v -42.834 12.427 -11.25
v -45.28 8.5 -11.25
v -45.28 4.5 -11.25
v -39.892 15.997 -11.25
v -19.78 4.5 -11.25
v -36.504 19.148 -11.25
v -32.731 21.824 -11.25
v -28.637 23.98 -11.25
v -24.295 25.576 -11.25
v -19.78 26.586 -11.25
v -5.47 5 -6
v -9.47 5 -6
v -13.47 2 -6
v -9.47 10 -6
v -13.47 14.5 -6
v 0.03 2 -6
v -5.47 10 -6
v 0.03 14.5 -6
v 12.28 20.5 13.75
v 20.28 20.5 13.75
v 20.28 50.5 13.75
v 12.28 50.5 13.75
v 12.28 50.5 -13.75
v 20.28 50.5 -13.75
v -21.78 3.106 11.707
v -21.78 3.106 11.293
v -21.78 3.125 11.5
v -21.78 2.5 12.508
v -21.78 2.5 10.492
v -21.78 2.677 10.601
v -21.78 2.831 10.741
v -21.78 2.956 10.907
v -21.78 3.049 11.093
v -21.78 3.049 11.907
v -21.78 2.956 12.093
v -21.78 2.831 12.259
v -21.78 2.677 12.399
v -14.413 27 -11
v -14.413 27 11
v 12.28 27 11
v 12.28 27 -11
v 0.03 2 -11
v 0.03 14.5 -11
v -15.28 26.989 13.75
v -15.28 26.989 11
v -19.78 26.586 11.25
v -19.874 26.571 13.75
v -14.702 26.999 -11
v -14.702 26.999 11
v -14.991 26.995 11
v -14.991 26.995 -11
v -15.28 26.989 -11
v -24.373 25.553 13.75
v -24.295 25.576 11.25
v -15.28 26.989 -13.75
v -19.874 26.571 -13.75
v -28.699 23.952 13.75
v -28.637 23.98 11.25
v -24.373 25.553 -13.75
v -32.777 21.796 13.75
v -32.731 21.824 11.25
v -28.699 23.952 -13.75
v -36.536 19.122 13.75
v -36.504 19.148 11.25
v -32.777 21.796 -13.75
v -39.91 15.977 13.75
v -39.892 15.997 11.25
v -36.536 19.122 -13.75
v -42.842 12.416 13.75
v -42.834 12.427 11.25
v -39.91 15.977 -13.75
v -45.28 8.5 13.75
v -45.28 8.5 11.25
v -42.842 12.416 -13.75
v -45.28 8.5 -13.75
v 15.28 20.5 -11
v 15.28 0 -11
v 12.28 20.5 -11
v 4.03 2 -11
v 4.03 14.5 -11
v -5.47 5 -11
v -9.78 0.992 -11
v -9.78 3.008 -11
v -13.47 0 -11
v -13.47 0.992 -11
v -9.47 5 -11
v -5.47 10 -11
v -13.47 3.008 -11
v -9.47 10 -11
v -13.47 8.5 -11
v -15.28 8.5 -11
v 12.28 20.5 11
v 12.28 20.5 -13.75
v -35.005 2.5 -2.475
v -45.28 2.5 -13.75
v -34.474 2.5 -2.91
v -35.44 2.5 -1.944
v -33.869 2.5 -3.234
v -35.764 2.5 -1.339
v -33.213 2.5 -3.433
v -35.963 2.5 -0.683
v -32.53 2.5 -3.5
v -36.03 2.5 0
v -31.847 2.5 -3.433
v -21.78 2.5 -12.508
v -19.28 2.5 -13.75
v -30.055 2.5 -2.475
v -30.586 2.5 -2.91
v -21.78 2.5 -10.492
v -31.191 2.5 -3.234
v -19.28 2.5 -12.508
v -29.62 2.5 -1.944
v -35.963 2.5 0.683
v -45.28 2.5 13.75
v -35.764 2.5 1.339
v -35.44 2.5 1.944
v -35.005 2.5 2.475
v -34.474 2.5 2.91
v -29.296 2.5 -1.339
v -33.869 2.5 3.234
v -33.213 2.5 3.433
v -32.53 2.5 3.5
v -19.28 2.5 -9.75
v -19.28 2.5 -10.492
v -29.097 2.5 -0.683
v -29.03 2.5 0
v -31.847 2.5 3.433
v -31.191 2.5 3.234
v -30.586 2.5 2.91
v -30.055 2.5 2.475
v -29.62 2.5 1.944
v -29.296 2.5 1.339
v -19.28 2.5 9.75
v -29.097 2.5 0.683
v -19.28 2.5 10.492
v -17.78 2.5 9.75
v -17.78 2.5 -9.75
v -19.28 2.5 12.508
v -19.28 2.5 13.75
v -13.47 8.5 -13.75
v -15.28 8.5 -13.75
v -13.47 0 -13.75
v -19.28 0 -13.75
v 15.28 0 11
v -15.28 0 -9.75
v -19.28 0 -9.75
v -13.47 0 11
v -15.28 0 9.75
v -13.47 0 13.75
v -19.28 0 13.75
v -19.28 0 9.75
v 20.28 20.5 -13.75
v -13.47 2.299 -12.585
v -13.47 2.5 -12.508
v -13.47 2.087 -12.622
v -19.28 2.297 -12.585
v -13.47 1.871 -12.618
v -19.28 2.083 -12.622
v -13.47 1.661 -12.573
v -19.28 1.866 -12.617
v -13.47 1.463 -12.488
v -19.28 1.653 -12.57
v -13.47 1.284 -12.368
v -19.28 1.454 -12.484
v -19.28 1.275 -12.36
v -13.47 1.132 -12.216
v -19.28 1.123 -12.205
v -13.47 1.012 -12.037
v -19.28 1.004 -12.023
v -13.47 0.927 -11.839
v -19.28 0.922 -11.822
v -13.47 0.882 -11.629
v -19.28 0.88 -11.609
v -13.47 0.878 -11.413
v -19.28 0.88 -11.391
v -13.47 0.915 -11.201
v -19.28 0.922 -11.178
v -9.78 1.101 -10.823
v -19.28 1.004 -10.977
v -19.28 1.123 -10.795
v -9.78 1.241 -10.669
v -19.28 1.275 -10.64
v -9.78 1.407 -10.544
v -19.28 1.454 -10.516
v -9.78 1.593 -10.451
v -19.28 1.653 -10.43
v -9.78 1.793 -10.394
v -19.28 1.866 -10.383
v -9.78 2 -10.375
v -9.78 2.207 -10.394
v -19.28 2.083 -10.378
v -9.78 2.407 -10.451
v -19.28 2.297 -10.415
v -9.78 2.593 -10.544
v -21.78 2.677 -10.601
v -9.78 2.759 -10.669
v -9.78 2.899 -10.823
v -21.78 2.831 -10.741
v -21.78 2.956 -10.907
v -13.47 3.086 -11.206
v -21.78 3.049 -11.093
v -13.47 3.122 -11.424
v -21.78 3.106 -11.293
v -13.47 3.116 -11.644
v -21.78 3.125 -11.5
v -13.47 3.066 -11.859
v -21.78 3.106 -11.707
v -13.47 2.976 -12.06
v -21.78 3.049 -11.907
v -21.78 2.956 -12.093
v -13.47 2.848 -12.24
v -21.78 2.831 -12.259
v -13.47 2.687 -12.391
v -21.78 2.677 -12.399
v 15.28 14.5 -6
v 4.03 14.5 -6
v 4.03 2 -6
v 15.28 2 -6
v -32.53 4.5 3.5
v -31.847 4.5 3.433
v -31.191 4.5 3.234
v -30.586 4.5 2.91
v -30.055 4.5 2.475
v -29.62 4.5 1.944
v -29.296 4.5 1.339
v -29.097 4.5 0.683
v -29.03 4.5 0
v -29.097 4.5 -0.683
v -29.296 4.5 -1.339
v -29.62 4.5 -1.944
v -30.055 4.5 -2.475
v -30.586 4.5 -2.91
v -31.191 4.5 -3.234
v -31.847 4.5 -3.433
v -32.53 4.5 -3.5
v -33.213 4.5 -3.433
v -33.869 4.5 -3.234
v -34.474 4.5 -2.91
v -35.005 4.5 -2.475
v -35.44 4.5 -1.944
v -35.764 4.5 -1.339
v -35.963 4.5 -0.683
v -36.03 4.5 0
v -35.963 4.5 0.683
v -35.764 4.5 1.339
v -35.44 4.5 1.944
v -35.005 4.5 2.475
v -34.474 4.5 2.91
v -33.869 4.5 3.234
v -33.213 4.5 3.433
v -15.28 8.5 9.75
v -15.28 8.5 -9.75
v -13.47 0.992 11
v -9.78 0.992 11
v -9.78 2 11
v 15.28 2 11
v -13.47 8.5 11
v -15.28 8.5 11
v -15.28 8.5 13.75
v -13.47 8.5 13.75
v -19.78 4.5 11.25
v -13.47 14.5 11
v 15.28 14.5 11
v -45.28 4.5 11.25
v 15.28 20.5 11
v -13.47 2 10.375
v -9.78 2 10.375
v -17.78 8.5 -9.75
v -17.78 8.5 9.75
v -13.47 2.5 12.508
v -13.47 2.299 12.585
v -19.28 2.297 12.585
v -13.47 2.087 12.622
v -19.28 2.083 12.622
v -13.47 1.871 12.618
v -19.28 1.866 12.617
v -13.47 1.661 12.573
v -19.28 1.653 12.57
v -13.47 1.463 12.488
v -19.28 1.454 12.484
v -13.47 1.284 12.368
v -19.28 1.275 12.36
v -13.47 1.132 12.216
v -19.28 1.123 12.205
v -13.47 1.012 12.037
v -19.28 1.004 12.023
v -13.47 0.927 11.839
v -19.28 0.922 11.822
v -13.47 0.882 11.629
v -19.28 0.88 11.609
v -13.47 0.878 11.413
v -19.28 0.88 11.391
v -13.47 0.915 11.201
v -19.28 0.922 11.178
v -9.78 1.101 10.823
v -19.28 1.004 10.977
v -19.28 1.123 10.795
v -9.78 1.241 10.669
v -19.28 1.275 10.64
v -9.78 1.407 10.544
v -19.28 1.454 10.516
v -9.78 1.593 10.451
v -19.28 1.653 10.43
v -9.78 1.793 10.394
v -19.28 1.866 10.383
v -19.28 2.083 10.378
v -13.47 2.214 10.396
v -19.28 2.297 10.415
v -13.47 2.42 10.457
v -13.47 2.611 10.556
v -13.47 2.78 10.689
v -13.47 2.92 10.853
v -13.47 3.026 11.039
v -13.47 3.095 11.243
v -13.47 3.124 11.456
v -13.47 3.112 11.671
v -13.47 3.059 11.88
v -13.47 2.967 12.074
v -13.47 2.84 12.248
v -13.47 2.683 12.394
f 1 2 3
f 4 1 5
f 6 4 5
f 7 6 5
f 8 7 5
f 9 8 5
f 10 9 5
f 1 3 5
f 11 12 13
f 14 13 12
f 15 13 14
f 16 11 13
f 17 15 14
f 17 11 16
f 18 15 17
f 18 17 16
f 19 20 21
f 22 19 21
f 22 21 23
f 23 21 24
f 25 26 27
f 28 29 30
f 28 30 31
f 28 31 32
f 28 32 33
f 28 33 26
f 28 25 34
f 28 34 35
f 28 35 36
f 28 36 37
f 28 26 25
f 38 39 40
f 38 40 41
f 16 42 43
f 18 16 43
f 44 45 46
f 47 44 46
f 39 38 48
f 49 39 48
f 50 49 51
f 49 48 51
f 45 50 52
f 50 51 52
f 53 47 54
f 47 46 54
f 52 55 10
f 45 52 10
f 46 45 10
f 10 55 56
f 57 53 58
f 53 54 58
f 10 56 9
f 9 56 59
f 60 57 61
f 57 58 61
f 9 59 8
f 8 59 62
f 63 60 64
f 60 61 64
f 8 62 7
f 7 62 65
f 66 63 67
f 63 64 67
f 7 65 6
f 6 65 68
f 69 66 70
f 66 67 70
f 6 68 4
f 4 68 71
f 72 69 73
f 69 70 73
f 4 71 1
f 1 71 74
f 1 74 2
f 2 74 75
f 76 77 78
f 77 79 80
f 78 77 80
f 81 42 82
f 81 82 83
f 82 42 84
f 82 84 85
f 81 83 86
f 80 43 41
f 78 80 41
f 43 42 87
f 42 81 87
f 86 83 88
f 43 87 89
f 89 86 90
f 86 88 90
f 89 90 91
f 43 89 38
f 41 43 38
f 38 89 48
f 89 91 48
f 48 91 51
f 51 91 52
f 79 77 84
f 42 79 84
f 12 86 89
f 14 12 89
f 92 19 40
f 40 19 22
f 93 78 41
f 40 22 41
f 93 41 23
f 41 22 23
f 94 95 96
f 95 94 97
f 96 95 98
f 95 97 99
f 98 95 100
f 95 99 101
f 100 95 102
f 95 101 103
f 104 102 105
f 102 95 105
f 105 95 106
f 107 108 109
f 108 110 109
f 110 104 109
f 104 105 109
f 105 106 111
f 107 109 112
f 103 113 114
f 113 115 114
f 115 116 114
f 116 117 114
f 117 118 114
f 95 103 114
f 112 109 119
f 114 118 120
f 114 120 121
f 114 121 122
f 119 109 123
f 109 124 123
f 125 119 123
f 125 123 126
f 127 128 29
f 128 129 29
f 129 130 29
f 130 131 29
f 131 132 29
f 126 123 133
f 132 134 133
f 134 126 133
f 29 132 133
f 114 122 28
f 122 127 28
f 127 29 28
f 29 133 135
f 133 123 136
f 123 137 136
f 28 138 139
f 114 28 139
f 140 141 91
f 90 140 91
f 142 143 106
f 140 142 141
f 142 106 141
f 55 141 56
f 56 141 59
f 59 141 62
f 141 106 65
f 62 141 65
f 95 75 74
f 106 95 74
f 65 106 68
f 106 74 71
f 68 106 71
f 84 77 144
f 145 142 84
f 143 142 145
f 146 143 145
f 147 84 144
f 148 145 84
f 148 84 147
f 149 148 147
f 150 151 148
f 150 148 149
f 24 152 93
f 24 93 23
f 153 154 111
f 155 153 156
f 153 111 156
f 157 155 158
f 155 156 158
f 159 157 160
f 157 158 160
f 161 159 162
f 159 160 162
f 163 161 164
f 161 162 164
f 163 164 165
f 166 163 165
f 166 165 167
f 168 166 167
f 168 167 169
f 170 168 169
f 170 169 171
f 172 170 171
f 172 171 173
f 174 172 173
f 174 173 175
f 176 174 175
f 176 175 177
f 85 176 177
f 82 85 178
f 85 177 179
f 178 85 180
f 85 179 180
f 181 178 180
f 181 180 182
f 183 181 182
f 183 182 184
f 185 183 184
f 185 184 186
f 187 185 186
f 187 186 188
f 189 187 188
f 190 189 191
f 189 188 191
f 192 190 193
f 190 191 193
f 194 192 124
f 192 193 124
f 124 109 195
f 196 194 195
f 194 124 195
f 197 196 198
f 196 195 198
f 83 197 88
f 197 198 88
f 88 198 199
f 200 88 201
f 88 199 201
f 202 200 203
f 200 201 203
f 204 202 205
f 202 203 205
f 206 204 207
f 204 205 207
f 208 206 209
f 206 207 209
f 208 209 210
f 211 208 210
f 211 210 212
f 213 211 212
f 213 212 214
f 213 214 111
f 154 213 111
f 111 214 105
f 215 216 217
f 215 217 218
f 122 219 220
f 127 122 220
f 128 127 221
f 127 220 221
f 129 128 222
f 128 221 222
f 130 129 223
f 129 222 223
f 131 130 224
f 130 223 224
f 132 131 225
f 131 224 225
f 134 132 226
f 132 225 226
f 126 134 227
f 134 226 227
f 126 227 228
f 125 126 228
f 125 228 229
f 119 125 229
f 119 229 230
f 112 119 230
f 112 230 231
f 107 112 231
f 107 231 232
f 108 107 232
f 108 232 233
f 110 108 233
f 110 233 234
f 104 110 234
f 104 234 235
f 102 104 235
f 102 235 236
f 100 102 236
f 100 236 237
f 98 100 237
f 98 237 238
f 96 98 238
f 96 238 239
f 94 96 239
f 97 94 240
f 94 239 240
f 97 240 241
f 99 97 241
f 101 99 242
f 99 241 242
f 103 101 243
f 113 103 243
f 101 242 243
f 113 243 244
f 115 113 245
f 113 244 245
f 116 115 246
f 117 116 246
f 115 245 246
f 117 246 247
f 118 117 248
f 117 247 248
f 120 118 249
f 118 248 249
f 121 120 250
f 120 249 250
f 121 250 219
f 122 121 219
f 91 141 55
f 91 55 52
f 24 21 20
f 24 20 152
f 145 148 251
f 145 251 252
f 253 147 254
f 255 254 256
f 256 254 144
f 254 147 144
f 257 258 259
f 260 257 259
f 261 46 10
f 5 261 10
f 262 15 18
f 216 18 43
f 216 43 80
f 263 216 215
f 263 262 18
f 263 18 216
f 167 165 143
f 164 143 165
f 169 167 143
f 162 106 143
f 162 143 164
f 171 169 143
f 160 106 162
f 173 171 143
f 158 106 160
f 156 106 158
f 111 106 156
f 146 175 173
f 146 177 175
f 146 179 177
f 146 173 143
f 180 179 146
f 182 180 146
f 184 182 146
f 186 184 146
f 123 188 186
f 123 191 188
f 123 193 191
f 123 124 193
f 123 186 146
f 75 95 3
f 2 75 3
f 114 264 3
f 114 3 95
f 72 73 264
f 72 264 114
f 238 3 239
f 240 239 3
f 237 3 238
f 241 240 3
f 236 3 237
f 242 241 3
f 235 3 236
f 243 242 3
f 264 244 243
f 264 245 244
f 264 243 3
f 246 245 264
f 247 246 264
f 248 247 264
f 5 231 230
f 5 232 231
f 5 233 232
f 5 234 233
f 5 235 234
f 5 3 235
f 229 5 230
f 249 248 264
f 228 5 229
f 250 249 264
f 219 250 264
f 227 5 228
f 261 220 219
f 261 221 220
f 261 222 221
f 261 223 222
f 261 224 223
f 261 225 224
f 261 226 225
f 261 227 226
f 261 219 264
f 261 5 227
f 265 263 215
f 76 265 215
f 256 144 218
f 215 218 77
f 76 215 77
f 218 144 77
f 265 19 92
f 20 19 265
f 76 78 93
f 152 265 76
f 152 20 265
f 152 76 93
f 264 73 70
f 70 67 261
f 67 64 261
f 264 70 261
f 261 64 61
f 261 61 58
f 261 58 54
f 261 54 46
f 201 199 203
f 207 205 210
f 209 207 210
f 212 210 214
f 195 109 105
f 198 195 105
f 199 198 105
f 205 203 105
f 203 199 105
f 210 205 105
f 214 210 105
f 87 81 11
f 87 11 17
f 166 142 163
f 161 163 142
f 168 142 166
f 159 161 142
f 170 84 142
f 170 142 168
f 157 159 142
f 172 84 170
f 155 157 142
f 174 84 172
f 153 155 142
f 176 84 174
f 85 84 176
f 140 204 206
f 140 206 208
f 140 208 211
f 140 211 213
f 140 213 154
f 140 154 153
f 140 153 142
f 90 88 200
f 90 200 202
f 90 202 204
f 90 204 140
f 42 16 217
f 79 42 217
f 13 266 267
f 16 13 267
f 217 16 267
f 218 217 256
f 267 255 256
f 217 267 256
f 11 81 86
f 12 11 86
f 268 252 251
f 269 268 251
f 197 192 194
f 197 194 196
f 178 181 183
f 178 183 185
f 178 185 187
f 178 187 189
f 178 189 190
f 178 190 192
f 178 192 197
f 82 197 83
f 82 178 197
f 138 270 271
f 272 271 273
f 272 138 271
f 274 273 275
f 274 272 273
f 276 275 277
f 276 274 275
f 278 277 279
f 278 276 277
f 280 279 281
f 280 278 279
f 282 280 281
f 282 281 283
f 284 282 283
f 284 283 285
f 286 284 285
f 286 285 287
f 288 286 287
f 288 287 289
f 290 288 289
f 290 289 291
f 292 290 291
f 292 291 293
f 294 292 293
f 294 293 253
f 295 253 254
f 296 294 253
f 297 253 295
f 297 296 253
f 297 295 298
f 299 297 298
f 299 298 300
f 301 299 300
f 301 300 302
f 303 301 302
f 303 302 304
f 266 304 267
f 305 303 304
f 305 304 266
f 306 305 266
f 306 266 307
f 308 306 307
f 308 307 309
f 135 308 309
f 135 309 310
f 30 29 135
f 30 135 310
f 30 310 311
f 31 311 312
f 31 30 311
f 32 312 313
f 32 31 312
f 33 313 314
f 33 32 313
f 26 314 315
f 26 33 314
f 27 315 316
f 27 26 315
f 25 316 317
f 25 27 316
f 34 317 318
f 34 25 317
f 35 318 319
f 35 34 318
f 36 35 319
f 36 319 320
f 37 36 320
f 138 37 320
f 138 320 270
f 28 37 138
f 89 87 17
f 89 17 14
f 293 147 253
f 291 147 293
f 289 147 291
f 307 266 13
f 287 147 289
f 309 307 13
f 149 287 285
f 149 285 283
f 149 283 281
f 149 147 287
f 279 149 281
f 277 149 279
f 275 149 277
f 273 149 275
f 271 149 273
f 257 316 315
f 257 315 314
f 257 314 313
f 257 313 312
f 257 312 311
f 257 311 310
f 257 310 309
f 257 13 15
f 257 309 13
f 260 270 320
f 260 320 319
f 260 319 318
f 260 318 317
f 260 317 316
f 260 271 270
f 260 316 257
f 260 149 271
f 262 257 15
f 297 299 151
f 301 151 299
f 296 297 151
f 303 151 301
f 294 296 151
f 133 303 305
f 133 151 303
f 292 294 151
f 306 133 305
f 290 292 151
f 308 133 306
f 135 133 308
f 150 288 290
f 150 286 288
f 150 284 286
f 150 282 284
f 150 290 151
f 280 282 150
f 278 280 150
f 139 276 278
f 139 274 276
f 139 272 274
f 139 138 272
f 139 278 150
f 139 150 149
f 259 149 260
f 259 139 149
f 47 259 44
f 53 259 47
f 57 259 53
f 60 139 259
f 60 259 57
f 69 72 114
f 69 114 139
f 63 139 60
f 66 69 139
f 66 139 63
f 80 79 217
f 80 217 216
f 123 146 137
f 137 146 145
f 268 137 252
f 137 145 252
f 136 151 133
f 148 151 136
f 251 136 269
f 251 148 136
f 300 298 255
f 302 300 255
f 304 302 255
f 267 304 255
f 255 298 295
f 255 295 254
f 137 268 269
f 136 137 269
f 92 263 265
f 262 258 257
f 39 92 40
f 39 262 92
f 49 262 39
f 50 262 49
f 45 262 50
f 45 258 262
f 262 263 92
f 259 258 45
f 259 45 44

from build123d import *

# Parameters (mm, degrees)
SKETCH2_W                        = 30.56
SKETCH2_H                        = 22
BOSS_EXTRUDE1_DEPTH              = 27
SKETCH4_W                        = 28.75
SKETCH4_H                        = 12.5
CUT_EXTRUDE1_DEPTH               = 17
SKETCH5_W                        = 4
SKETCH5_H                        = 12.5
SKETCH5_H_2                      = 5
CUT_EXTRUDE2_DEPTH               = 39.032596546
SKETCH9_W                        = 27.5
SKETCH9_H                        = 18.5
BOSS_EXTRUDE2_DEPTH              = 30
FILLET1_R                        = 35
BOSS_EXTRUDE3_DEPTH              = 6
SKETCH10_6_W                     = 25.5
SKETCH10_6_H                     = 22.5
CUT_EXTRUDE3_DEPTH               = 51.80935839
SKETCH13_W                       = 22.5
SKETCH13_H                       = 2
BOSS_EXTRUDE4_DEPTH              = 25.5
SKETCH14_R                       = 3.5
CUT_EXTRUDE4_DEPTH               = 53.398386426
SKETCH20_W                       = 4
SKETCH20_H                       = 8.5
BOSS_EXTRUDE13_DEPTH             = 4
BOSS_EXTRUDE13_DIRECTION_2_REACH = 45.035
CUT_EXTRUDE5_START               = -4
SKETCH15_R                       = 1.125
CUT_EXTRUDE5_DEPTH               = 12
SKETCH21_W                       = 22
SKETCH21_H                       = 6.5
BOSS_EXTRUDE14_DEPTH             = 5
SKETCH22_W                       = 27.5
SKETCH22_H                       = 30
BOSS_EXTRUDE15_DEPTH             = 8


with BuildPart() as part:
    # Sketch2 → Boss-Extrude1 (new body)
    with BuildSketch(Plane(origin=(0, 0, 0), x_dir=(1, 0, 0), z_dir=(0, 1, 0))):
        Rectangle(SKETCH2_W, SKETCH2_H)
    extrude(amount=BOSS_EXTRUDE1_DEPTH)

    # Sketch4 → Cut-Extrude1 (cut)
    with BuildSketch(Plane.XY.offset(11)):
        with Locations((0.905, 8.25)):
            Rectangle(SKETCH4_W, SKETCH4_H)
    extrude(amount=-CUT_EXTRUDE1_DEPTH, mode=Mode.SUBTRACT)

    # Sketch5 → Cut-Extrude2 (cut, through all)
    with BuildSketch(Plane(origin=(0, 0, -11), x_dir=(-1, 0, 0), z_dir=(0, 0, -1))):
        with Locations((-2.03, 8.25)):
            Rectangle(SKETCH5_W, SKETCH5_H)
        with Locations((7.47, 7.5)):
            Rectangle(SKETCH5_W, SKETCH5_H_2)
    extrude(amount=-CUT_EXTRUDE2_DEPTH, mode=Mode.SUBTRACT)

    # Sketch9 → Boss-Extrude2 (add)
    with BuildSketch(Plane.ZY.offset(15.28)):
        with Locations((0, 17.75)):
            Rectangle(SKETCH9_W, SKETCH9_H)
    extrude(amount=BOSS_EXTRUDE2_DEPTH)

    # Fillet1
    # the kernel refuses this fillet: 35 mm, written as the material it takes off along each edge
    with BuildSketch(Plane(origin=(-45.28, 27, -90.91662167), x_dir=(1, 0, 0), z_dir=(0, 0, 1))) as fillet1_piece_1:
        with BuildLine():
            CenterArc((30.866648668, -35), FILLET1_R, 90, 61.872931781)
            Line((0, -18.5), (-0.617332973, -18.17))
            ThreePointArc((-0.617332973, -18.17), (-0.7, -9.25), (-0.7, 0))
            Line((-0.7, 0), (0, 0.7))
            Line((0, 0.7), (30.866648668, 0.7))
            Line((30.866648668, 0.7), (30.866648668, 0))
        make_face()
    extrude(amount=181.833243341, mode=Mode.SUBTRACT)

    # Sketch10 → Boss-Extrude3 (add)
    with BuildSketch(Plane.XZ.offset(-8.5)):
        Polygon((-45.28, 13.75), (-45.28, 11.25), (-19.78, 11.25), (-19.78, -11.25), (-45.28, -11.25), (-45.28, -13.75), (-17.78, -13.75), (-17.78, 13.75), align=None)
    extrude(amount=BOSS_EXTRUDE3_DEPTH)

    # Sketch10<6> → Cut-Extrude3 (cut, through all)
    with BuildSketch(Plane.XZ.offset(-8.5)):
        with Locations((-32.53, 0)):
            Rectangle(SKETCH10_6_W, SKETCH10_6_H)
    extrude(amount=-CUT_EXTRUDE3_DEPTH, mode=Mode.SUBTRACT)

    # Sketch13 → Boss-Extrude4 (add)
    with BuildSketch(Plane.ZY.offset(19.78)):
        with Locations((0, 3.5)):
            Rectangle(SKETCH13_W, SKETCH13_H)
    extrude(amount=BOSS_EXTRUDE4_DEPTH)

    # Sketch14 → Cut-Extrude4 (cut, through all)
    with BuildSketch(Plane(origin=(0, 4.5, 0), x_dir=(1, 0, 0), z_dir=(0, 1, 0))):
        with Locations(Location((-32.53, 0, 0), (0, 0, 270))):
            Circle(SKETCH14_R)
    extrude(amount=-CUT_EXTRUDE4_DEPTH, mode=Mode.SUBTRACT)

    # Sketch20 → Boss-Extrude13 (add)
    with BuildSketch(Plane.ZY.offset(15.28)):
        with Locations((11.75, 4.25)):
            Rectangle(SKETCH20_W, SKETCH20_H)
        with Locations((-11.75, 4.25)):
            Rectangle(SKETCH20_W, SKETCH20_H)
    extrude(amount=BOSS_EXTRUDE13_DEPTH)

    # Boss-Extrude13 direction 2: up to this face of the body (flat: up to its plane)
    boss_extrude13_direction_2_end = Plane(part.part.faces().sort_by_distance((-13.47, 8.25, 2.5))[0])
    # Sketch20 → Boss-Extrude13 direction 2 (add, up to the picked face)
    with BuildSketch(Plane.ZY.offset(15.28), mode=Mode.PRIVATE) as boss_extrude13_direction_2_sk1:
        with Locations((11.75, 4.25)):
            Rectangle(SKETCH20_W, SKETCH20_H)
    boss_extrude13_direction_2_tool1 = split(extrude(boss_extrude13_direction_2_sk1.sketch, amount=-BOSS_EXTRUDE13_DIRECTION_2_REACH, mode=Mode.PRIVATE), bisect_by=boss_extrude13_direction_2_end, keep=Keep.BOTH, mode=Mode.PRIVATE)
    # Sketch20 → Boss-Extrude13 direction 2 (add, up to the picked face)
    with BuildSketch(Plane.ZY.offset(15.28), mode=Mode.PRIVATE) as boss_extrude13_direction_2_sk2:
        with Locations((-11.75, 4.25)):
            Rectangle(SKETCH20_W, SKETCH20_H)
    boss_extrude13_direction_2_tool2 = split(extrude(boss_extrude13_direction_2_sk2.sketch, amount=-BOSS_EXTRUDE13_DIRECTION_2_REACH, mode=Mode.PRIVATE), bisect_by=boss_extrude13_direction_2_end, keep=Keep.BOTH, mode=Mode.PRIVATE)
    add(boss_extrude13_direction_2_tool1.solids().sort_by(Axis((-15.28, 4.25, 11.75), (1, 0, 0)))[0])
    add(boss_extrude13_direction_2_tool2.solids().sort_by(Axis((-15.28, 4.25, -11.75), (1, 0, 0)))[0])

    # Sketch15 → Cut-Extrude5 (cut)
    with BuildSketch(Plane(origin=(-17.78, 0, 0), x_dir=(0, 0, -1), z_dir=(1, 0, 0)).offset(CUT_EXTRUDE5_START)):
        with Locations(Location((-11.5, 2, 0), (0, 0, 153.612200039))):
            Circle(SKETCH15_R)
    cut_extrude5 = extrude(amount=CUT_EXTRUDE5_DEPTH, mode=Mode.SUBTRACT)

    # Mirror3: Cut-Extrude5 across plane
    add(cut_extrude5.mirror(Plane.XY), mode=Mode.SUBTRACT)

    # Sketch21 → Boss-Extrude14 (add)
    with BuildSketch(Plane(origin=(15.28, 0, 0), x_dir=(0, 0, -1), z_dir=(1, 0, 0))):
        with Locations((0, 23.75)):
            Rectangle(SKETCH21_W, SKETCH21_H)
    extrude(amount=BOSS_EXTRUDE14_DEPTH)

    # Sketch22 → Boss-Extrude15 (add)
    with BuildSketch(Plane(origin=(20.28, 0, 0), x_dir=(0, 0, -1), z_dir=(1, 0, 0))):
        with Locations((0, 35.5)):
            Rectangle(SKETCH22_W, SKETCH22_H)
    extrude(amount=-BOSS_EXTRUDE15_DEPTH)


solid = part.part
